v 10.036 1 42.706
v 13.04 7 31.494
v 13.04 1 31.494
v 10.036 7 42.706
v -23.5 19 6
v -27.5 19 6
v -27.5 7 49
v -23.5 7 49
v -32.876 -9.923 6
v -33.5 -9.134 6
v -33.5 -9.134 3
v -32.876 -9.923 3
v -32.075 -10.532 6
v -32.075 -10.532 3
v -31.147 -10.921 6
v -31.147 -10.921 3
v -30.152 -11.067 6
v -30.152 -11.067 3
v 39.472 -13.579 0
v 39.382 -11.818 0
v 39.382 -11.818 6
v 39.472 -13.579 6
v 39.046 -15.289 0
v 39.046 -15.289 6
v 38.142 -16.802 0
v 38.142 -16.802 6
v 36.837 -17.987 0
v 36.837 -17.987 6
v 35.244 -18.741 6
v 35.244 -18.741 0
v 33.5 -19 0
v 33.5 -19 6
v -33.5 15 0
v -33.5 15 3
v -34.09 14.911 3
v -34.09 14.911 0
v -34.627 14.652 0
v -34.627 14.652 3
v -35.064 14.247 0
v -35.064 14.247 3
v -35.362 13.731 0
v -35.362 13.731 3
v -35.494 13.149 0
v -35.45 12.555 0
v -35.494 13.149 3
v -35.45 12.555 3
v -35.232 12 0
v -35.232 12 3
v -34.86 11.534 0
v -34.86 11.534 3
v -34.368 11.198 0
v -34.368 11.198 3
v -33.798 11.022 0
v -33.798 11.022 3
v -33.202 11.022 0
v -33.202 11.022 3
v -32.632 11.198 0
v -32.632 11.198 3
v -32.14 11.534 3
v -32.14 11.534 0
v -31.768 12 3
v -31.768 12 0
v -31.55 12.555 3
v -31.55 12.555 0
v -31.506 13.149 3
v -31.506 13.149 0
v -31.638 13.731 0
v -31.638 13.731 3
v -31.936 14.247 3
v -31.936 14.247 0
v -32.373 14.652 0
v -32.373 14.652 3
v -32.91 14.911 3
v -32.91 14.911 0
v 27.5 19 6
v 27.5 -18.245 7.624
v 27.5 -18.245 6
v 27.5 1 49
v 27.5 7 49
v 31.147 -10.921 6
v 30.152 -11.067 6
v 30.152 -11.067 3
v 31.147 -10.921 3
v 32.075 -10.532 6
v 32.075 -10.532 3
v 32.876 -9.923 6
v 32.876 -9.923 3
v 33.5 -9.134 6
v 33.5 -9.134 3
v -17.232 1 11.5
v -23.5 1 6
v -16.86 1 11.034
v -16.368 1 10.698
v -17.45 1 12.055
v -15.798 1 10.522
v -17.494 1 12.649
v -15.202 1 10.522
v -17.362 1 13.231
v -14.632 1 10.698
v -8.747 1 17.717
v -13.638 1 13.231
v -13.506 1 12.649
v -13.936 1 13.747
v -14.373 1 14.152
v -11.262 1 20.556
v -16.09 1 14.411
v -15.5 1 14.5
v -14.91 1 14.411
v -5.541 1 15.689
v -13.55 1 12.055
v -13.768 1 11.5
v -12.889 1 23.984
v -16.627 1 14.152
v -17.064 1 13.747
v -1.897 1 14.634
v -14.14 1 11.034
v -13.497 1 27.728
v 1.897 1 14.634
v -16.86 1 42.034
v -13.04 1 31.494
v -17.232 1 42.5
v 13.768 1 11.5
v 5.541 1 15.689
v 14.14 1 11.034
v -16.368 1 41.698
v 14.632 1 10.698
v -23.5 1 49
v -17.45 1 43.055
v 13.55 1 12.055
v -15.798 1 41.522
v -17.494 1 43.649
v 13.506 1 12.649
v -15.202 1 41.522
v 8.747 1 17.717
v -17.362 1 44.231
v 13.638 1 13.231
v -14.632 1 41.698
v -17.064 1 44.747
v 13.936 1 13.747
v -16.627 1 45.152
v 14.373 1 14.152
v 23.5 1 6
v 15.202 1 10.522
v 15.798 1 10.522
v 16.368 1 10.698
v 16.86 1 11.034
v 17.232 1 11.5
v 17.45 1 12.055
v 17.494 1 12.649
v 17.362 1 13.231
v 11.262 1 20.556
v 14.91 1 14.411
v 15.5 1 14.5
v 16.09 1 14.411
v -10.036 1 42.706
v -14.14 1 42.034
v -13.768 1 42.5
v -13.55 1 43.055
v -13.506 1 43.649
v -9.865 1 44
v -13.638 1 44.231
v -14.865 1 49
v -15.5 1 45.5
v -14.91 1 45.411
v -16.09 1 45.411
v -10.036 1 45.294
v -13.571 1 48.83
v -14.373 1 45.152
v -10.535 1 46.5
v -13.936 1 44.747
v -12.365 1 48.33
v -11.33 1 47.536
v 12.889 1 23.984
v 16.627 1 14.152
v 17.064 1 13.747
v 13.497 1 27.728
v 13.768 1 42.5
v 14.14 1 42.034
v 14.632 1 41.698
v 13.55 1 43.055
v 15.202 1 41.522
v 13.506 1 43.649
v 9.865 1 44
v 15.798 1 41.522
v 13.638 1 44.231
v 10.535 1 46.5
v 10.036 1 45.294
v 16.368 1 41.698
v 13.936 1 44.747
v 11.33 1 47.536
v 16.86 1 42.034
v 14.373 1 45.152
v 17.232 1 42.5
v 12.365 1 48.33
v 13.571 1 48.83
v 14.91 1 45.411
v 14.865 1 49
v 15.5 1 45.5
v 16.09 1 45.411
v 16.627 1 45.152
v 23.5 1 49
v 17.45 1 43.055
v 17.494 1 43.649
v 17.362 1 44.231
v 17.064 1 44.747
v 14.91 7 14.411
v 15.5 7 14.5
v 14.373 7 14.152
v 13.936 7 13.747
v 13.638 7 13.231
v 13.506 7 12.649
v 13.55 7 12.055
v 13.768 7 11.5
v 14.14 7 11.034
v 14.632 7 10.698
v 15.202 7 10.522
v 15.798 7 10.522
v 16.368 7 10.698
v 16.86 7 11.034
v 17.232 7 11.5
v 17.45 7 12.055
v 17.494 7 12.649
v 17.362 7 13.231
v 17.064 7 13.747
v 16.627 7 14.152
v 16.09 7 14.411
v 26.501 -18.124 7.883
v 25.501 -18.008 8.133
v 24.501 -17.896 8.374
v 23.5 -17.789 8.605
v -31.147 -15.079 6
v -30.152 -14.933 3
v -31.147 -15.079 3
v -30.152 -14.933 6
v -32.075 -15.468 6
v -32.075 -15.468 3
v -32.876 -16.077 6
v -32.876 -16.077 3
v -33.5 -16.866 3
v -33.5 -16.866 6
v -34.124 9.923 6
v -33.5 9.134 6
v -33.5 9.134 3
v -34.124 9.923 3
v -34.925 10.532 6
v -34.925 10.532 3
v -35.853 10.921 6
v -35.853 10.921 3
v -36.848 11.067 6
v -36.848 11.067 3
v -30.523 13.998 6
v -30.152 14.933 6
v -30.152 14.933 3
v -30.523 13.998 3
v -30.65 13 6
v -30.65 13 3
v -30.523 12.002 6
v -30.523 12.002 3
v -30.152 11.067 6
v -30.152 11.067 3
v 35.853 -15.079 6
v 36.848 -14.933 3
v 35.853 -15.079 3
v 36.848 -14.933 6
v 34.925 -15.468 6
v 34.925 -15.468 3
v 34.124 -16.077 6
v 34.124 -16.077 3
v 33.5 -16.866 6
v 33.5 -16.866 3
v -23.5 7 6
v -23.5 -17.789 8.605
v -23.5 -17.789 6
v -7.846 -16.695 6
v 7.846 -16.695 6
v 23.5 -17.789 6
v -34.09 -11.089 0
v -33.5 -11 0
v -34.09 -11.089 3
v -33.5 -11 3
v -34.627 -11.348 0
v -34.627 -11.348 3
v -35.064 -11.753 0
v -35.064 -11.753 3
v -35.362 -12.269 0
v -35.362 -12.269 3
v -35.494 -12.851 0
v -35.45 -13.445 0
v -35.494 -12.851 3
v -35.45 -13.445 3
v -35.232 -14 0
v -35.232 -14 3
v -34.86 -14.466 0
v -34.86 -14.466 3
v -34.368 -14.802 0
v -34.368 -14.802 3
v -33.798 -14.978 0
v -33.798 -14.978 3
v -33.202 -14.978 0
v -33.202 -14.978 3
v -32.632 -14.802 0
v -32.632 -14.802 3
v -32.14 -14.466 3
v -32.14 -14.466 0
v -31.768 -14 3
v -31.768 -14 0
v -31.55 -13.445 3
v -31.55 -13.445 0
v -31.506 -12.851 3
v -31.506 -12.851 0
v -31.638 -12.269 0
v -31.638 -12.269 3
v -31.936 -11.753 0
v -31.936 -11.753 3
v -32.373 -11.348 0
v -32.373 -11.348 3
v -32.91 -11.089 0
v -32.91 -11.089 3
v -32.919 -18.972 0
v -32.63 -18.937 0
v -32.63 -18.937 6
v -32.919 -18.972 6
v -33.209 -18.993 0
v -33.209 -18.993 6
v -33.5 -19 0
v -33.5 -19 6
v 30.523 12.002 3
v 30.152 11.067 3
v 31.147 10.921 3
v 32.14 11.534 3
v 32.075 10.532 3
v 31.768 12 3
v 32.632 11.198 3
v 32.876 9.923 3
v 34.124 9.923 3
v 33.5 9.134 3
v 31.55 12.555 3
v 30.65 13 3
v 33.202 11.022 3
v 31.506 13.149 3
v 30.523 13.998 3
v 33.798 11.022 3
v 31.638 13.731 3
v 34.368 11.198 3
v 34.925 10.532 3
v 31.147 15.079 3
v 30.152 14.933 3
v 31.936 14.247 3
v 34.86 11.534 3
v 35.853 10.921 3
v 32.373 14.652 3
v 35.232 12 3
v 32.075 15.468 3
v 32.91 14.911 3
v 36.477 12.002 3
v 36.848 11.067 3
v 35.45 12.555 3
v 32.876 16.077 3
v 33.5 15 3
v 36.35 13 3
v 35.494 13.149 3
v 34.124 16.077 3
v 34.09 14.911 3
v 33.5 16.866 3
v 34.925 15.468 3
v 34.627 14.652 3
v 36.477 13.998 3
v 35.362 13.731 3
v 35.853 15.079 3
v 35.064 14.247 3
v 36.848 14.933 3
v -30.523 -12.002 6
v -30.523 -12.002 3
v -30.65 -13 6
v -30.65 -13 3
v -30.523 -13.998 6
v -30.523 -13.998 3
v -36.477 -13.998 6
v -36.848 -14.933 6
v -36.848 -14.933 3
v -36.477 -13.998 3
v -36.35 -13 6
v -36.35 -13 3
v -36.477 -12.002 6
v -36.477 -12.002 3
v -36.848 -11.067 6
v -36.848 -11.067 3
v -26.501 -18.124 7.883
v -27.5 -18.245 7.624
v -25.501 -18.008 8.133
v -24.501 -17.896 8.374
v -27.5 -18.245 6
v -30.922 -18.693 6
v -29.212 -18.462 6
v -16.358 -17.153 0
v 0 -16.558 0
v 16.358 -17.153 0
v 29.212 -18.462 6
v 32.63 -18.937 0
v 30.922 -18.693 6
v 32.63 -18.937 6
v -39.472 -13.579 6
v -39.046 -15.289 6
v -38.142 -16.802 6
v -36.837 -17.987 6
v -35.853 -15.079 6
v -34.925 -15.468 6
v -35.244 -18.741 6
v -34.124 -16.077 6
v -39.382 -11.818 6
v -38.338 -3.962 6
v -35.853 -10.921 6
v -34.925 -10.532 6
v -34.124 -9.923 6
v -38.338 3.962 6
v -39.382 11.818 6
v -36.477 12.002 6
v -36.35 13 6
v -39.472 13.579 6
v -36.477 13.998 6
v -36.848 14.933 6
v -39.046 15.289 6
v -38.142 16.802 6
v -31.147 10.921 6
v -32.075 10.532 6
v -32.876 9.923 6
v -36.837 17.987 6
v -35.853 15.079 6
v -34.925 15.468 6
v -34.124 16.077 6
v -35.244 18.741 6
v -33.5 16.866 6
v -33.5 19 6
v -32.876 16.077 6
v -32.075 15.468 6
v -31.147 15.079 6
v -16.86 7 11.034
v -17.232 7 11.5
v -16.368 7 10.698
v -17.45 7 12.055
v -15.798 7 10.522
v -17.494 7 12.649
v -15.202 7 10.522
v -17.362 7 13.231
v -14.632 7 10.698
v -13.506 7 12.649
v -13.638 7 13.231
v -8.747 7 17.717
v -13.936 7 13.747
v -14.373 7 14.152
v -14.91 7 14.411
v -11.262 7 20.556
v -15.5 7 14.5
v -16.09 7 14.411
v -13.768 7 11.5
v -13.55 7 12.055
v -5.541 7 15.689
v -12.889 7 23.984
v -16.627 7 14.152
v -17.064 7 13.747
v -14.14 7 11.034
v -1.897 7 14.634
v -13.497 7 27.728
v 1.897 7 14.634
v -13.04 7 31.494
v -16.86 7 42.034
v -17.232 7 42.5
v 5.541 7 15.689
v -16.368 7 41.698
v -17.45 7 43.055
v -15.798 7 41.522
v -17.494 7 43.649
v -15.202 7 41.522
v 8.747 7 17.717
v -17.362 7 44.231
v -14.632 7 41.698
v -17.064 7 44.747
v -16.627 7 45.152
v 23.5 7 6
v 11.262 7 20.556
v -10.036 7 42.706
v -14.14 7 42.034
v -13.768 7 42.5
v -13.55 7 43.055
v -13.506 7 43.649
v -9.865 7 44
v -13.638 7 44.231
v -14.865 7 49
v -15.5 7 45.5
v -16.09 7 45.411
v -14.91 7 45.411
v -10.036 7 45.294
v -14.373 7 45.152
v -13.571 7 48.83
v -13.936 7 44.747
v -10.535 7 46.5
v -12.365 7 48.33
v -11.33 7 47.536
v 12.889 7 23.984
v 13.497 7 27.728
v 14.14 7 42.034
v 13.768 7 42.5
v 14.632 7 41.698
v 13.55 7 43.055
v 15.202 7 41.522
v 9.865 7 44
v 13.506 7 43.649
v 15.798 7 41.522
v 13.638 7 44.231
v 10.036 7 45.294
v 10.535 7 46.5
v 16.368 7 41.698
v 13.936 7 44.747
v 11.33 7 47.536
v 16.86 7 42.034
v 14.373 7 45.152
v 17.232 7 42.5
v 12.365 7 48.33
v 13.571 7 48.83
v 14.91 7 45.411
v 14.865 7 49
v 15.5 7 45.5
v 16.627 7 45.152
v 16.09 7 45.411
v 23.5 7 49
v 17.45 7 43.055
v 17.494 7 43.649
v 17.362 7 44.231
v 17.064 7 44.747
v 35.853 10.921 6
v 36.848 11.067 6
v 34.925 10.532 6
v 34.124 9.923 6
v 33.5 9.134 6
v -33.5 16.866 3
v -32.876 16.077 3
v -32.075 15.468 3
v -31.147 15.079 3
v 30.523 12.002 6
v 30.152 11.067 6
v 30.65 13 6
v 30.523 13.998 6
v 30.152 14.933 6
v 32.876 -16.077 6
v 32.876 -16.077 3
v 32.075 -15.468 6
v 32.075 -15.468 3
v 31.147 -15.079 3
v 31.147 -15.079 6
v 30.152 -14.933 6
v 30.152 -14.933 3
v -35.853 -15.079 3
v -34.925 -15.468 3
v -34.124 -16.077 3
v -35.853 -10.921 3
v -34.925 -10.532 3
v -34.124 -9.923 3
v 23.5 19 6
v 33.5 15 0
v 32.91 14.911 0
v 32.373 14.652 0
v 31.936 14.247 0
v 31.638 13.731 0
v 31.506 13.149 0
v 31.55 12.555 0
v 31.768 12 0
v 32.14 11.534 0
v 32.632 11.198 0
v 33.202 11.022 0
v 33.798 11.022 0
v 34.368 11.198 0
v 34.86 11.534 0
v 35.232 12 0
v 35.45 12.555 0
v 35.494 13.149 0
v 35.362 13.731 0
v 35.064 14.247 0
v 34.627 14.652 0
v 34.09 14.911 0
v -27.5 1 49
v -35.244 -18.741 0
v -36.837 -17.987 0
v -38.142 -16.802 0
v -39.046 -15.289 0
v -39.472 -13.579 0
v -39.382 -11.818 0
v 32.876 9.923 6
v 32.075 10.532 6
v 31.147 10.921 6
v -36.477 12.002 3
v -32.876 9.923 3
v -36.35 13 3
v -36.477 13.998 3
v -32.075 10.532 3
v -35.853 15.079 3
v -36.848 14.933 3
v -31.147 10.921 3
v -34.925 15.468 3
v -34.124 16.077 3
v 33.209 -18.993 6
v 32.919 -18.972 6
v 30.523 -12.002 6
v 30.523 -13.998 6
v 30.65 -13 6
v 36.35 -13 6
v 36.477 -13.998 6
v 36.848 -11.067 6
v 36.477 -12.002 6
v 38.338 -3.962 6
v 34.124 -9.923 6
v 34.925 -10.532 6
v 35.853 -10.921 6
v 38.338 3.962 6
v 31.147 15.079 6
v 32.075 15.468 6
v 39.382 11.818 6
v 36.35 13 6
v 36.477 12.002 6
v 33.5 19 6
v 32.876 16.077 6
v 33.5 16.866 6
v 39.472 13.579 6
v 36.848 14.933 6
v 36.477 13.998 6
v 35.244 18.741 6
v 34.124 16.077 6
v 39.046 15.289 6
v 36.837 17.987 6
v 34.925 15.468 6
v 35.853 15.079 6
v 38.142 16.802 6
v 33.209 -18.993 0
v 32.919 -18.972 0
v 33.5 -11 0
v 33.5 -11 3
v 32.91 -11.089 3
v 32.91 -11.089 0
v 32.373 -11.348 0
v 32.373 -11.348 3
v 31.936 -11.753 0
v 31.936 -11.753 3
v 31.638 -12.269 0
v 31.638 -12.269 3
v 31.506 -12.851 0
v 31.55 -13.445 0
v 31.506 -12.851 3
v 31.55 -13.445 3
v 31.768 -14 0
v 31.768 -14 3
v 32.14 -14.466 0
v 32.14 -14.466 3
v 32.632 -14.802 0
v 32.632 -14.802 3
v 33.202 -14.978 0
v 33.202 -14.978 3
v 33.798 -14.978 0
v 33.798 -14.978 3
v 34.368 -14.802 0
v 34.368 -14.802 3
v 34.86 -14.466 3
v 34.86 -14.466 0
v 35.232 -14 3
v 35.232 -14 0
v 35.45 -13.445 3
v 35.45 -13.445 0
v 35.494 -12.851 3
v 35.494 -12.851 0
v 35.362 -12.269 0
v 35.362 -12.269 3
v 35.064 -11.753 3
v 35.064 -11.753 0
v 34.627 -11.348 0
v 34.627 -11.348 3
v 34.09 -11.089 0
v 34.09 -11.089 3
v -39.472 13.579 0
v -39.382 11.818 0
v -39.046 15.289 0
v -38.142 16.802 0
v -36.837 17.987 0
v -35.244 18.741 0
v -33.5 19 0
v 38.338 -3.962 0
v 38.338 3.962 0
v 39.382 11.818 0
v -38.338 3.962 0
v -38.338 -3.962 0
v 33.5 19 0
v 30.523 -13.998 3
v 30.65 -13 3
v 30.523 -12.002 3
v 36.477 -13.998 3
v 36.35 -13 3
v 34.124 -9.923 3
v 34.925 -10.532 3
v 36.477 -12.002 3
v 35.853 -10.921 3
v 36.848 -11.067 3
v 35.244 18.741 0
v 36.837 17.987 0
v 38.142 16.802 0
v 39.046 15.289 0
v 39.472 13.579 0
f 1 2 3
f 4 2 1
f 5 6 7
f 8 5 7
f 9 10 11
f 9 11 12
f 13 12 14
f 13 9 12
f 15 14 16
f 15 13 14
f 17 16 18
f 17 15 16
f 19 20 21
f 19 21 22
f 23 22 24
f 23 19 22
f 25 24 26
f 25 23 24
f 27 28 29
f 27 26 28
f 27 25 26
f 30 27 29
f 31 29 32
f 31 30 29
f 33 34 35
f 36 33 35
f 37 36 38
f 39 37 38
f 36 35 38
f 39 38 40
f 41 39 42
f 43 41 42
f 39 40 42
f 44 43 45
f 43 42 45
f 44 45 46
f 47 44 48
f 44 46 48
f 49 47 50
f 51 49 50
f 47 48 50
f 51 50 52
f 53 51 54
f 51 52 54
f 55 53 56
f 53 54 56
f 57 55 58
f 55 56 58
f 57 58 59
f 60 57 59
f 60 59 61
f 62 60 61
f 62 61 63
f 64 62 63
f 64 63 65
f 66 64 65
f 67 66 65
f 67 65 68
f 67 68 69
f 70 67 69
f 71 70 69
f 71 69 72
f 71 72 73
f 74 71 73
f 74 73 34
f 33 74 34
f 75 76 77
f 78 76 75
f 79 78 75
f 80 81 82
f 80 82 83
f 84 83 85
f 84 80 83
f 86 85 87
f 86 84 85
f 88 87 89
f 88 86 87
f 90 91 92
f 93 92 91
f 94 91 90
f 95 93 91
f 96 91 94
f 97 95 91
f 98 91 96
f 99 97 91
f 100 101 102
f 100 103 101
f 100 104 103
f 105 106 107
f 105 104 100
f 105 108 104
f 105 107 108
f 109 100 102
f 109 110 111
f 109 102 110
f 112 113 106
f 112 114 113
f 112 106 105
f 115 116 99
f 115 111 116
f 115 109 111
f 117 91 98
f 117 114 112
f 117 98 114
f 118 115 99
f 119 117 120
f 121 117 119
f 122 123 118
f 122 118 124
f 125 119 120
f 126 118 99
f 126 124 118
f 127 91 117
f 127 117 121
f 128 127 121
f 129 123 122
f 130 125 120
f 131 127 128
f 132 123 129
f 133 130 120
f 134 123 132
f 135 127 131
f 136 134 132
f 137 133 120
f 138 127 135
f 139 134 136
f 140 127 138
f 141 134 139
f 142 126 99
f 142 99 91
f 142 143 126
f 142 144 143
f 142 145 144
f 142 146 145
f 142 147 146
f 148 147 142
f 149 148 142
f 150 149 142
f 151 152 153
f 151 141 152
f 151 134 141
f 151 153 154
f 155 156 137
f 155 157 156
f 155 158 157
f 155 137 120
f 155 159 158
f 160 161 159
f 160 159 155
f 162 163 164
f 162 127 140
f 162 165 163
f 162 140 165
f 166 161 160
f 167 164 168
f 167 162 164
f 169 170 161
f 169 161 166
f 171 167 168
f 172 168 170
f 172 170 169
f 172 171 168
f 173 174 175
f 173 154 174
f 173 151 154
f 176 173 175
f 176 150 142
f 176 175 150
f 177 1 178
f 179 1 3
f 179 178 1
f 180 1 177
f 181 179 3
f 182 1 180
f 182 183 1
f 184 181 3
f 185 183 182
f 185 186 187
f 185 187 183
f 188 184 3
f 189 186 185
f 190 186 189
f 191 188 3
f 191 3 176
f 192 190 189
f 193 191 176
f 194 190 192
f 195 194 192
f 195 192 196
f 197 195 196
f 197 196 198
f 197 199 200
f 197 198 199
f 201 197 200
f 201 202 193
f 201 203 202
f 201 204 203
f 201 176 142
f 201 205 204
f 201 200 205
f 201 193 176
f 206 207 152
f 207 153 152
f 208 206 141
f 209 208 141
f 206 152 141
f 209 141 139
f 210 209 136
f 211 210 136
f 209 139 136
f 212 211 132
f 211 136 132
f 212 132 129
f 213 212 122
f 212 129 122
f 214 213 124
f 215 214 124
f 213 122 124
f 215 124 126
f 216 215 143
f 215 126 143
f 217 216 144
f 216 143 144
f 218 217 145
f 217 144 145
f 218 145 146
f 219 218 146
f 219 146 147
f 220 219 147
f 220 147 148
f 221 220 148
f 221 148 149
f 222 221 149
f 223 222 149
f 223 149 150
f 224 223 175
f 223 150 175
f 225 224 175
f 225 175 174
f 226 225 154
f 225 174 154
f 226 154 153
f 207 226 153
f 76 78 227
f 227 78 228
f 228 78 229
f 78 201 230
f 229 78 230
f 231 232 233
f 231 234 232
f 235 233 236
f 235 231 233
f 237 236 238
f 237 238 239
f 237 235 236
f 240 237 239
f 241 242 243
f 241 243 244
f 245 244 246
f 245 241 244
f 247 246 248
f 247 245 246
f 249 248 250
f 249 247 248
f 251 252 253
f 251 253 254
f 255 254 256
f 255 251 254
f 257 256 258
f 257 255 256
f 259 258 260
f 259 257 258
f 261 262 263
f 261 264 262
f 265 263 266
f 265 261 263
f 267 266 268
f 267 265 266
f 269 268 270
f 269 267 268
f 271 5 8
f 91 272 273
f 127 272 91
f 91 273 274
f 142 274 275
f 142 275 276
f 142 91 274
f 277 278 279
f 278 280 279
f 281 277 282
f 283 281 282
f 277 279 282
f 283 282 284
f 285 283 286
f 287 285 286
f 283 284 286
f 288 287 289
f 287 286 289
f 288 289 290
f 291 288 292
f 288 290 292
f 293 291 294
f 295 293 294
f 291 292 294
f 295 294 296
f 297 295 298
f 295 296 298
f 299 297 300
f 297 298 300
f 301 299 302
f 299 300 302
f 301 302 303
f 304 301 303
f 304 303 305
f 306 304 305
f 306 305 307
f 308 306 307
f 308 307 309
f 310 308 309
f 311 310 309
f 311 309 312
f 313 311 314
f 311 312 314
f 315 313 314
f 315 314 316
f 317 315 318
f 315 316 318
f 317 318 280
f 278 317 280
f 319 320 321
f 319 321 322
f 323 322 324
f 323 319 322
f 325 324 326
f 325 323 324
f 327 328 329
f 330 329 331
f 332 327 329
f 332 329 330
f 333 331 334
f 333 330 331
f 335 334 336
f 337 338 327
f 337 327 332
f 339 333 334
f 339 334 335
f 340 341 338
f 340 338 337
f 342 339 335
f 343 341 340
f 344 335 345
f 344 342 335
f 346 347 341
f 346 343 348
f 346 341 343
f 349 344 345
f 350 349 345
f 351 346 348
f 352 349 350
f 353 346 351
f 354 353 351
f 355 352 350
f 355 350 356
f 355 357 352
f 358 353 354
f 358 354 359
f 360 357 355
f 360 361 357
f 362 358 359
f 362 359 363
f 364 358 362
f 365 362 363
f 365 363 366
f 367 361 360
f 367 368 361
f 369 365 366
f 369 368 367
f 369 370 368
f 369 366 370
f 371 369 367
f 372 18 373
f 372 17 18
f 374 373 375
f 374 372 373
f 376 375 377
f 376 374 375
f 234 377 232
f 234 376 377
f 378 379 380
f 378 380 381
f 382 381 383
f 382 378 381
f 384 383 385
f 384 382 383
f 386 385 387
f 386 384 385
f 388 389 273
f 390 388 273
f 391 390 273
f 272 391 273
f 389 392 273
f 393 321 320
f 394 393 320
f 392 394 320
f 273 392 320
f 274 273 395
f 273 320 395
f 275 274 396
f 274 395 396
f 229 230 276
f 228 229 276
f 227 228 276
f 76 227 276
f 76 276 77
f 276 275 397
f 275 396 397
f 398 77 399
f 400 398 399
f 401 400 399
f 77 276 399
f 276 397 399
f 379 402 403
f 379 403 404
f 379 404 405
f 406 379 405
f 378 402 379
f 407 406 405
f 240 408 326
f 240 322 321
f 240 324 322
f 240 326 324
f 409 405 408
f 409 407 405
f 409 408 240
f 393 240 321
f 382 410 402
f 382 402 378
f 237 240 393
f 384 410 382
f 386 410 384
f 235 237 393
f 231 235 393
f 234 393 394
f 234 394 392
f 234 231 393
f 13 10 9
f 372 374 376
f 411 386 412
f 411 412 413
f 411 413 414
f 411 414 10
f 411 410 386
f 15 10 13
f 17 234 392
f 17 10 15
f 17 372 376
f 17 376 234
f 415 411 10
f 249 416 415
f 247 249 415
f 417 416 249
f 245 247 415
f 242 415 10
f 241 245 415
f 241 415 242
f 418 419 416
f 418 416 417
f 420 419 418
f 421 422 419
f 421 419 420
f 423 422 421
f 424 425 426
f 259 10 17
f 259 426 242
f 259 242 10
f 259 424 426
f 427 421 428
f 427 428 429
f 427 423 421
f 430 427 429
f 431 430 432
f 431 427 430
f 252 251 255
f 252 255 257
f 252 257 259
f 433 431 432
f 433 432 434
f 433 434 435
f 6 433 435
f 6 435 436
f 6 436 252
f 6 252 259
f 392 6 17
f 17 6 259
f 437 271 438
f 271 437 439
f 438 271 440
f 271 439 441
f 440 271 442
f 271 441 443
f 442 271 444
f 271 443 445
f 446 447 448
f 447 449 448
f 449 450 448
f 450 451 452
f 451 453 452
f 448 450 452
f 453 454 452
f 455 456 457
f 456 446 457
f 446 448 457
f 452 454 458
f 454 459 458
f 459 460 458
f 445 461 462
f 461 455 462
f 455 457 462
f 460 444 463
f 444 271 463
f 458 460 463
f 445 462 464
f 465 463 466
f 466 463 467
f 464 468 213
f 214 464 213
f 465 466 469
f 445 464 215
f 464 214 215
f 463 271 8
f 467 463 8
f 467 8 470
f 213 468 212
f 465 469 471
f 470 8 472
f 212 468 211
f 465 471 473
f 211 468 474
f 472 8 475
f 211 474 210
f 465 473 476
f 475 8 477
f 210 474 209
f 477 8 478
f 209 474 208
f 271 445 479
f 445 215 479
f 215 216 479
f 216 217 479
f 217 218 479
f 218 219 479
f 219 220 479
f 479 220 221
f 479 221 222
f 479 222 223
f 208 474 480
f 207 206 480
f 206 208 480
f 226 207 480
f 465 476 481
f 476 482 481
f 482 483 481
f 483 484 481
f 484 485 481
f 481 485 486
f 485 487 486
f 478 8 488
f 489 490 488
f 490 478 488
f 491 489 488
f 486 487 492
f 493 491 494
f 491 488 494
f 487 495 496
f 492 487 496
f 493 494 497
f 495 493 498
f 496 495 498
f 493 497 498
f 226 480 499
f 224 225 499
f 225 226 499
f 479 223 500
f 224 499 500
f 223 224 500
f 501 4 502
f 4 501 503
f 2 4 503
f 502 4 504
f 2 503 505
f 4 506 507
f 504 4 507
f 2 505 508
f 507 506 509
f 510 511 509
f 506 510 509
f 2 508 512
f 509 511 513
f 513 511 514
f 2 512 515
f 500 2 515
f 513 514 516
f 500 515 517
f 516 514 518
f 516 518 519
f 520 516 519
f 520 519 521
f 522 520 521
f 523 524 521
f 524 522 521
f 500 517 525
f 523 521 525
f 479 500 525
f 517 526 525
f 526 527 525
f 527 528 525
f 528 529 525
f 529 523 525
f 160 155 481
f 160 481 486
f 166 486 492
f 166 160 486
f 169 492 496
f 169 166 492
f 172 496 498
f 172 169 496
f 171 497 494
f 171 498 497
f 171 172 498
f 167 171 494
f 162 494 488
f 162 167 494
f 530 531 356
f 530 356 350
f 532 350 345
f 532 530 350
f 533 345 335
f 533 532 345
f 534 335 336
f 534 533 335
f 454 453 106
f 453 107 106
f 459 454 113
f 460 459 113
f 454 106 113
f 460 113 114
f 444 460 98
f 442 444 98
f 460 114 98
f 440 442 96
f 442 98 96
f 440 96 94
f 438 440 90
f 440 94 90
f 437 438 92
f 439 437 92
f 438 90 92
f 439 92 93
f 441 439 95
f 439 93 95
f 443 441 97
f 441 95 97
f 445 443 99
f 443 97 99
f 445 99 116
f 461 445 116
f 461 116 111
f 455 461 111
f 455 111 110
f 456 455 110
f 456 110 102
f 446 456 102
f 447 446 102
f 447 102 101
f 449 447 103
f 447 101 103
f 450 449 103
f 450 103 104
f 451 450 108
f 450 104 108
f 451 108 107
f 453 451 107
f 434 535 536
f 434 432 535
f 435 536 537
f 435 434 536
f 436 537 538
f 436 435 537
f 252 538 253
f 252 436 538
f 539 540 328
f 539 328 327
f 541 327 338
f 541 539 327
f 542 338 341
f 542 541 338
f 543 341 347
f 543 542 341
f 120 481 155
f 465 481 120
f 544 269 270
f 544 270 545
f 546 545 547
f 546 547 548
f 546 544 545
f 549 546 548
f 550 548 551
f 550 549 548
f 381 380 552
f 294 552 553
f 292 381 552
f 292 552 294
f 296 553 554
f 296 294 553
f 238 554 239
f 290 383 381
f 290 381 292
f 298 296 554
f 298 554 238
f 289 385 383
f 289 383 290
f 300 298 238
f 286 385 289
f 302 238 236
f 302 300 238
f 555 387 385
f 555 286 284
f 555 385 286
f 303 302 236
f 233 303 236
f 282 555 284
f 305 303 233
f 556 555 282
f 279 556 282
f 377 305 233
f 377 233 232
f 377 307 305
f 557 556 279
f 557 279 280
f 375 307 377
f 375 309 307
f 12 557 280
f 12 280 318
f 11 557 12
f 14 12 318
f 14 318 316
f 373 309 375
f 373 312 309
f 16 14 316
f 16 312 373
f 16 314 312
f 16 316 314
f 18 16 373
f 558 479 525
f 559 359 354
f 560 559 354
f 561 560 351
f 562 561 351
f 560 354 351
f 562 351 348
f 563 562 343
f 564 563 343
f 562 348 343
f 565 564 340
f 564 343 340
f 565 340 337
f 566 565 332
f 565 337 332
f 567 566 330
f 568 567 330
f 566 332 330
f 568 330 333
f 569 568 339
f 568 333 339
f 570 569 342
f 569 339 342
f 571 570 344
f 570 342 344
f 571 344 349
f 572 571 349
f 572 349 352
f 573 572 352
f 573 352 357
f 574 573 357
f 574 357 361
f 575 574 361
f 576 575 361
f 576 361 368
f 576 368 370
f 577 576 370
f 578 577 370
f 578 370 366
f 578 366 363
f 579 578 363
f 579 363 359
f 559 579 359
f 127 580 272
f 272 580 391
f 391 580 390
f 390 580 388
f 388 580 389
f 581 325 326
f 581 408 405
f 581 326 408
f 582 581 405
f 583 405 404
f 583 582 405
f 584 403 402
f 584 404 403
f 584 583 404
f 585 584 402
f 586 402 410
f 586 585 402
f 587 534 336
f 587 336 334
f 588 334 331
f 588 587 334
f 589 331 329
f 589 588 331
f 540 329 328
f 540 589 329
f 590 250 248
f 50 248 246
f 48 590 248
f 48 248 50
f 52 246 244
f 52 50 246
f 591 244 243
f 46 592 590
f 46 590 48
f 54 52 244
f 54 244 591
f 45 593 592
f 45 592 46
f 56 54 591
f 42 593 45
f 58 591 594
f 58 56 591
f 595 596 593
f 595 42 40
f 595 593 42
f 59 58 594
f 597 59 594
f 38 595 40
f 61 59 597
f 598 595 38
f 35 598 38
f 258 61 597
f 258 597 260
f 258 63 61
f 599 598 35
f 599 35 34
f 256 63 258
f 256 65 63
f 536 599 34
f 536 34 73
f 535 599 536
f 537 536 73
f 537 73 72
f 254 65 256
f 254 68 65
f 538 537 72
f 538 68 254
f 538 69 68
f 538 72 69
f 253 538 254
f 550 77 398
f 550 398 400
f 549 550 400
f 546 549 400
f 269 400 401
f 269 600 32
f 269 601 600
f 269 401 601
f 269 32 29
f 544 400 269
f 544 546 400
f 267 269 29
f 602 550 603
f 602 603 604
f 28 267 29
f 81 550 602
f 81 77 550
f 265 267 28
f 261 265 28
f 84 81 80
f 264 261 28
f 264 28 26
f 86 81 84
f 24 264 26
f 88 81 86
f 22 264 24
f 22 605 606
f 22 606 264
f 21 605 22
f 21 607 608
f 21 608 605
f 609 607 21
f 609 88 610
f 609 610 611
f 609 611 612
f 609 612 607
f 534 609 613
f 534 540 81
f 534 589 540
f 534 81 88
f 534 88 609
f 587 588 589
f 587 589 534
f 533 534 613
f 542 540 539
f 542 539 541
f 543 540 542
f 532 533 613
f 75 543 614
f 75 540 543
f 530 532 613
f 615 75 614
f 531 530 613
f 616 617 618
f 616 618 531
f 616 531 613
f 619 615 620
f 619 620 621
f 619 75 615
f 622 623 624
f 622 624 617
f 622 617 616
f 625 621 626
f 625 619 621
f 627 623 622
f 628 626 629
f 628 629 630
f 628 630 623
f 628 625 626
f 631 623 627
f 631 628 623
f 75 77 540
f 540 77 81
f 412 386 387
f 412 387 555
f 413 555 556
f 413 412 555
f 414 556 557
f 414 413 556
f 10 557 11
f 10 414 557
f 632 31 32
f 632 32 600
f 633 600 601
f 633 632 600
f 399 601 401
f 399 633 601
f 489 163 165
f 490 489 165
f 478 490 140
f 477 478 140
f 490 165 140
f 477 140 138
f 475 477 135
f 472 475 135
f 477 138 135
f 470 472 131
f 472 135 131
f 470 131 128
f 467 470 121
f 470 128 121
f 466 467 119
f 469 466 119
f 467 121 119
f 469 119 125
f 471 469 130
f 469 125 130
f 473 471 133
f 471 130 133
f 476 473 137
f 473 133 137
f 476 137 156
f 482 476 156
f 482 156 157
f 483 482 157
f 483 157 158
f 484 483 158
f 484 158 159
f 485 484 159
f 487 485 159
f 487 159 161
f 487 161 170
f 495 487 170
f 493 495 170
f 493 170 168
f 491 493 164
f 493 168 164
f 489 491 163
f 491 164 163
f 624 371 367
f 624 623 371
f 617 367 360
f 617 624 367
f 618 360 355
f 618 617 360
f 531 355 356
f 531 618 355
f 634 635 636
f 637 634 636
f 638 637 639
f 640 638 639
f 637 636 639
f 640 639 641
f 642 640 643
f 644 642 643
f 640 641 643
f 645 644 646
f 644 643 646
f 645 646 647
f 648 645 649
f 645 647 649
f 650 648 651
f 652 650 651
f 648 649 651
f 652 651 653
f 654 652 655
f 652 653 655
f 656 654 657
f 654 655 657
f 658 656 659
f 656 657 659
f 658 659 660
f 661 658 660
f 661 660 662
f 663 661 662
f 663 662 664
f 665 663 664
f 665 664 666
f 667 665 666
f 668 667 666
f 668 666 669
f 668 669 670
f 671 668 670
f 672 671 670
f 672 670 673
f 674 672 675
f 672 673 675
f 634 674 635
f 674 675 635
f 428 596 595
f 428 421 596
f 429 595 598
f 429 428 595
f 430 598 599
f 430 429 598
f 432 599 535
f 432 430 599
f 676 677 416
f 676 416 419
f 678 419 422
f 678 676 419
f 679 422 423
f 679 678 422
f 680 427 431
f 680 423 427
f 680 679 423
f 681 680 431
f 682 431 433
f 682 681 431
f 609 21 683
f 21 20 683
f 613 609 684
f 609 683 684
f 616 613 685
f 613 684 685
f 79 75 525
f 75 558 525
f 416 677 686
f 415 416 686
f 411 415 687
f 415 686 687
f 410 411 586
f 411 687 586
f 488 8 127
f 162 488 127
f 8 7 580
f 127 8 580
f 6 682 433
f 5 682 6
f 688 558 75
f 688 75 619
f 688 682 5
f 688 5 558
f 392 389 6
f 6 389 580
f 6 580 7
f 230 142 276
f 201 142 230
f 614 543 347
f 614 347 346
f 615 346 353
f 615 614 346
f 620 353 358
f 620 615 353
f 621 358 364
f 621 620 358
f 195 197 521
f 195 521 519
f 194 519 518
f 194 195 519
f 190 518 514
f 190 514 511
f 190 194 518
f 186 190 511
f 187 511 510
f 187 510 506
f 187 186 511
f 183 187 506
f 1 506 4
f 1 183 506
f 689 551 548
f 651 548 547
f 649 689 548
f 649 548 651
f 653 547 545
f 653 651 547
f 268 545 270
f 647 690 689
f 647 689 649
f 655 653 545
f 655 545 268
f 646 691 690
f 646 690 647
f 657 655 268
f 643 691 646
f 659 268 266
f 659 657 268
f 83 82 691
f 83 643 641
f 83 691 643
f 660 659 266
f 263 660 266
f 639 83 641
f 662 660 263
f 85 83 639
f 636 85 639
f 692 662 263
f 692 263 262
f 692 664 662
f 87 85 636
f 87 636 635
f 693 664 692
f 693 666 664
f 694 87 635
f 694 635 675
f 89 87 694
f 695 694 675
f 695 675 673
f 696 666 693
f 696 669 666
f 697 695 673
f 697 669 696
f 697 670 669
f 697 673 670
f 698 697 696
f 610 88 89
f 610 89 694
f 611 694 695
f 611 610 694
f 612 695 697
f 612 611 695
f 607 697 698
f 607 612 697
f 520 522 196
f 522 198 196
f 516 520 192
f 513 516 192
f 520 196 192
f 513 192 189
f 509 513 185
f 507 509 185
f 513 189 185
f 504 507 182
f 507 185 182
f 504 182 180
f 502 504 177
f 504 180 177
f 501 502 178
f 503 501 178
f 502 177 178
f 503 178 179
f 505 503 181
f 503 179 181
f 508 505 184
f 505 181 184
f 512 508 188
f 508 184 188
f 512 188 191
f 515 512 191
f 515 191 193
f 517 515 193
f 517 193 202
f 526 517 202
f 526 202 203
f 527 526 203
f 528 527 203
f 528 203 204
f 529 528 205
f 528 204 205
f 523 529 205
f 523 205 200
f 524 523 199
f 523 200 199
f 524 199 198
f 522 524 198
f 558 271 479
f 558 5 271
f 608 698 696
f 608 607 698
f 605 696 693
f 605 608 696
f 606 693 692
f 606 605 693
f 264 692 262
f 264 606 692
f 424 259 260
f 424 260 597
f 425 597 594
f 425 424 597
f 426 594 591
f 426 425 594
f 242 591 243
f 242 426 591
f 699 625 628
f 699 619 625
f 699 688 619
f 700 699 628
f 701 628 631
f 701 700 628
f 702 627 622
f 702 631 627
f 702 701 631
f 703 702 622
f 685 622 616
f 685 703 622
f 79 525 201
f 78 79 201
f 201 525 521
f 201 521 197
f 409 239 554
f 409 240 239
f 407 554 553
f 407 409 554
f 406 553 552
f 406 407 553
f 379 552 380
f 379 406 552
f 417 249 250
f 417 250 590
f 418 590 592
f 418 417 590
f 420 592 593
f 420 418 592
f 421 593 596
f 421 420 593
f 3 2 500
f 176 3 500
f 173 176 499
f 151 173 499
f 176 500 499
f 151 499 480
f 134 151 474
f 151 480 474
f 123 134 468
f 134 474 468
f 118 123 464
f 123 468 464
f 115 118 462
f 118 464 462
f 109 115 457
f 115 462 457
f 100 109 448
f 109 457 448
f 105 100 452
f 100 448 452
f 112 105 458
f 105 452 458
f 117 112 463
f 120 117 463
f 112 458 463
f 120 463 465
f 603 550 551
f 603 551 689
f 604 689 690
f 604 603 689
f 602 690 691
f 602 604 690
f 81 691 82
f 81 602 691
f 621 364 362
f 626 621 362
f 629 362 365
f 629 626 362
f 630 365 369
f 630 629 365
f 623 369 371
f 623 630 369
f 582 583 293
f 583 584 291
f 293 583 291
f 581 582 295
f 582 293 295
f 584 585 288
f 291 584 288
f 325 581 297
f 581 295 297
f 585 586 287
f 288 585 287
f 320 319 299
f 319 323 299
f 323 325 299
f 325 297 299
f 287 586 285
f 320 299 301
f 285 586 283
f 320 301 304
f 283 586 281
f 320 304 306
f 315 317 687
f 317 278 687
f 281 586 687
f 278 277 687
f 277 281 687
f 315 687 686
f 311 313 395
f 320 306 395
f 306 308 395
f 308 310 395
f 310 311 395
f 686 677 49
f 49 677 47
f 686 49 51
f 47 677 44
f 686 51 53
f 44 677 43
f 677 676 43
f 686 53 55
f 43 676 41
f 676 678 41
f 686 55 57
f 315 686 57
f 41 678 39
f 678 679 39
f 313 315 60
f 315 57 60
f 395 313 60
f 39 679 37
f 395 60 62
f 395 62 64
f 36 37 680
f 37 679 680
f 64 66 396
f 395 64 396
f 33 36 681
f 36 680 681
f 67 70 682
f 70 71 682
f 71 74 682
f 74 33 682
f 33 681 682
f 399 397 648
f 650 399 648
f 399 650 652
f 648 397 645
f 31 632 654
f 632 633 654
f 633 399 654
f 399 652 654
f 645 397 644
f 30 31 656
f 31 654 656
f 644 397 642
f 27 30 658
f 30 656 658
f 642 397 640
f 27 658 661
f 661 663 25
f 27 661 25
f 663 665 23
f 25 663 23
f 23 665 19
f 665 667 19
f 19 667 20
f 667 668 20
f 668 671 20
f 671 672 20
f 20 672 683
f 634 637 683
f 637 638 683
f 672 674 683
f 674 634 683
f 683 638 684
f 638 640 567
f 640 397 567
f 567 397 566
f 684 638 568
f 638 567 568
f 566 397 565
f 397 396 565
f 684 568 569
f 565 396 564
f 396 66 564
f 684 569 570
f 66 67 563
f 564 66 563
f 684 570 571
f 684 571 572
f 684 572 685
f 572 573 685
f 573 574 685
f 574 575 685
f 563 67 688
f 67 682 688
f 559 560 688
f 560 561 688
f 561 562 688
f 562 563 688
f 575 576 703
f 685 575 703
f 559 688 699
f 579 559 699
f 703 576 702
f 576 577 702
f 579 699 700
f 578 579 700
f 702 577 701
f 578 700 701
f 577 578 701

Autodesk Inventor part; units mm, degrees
ref_plane "YZ Plane" through (0, 0, 0) normal (1, 0, 0) x (0, 1, 0)
ref_plane "XZ Plane" through (0, 0, 0) normal (0, 1, 0) x (-1, 0, 0)
ref_plane "XY Plane" through (0, 0, 0) normal (0, 0, 1) x (1, 0, 0)
sketch "Sketch1" plane through (0, 0, 0) normal (0, 0, 1) x (1, 0, 0)
  line L0 (-33.5, -13) -> (33.5, -13) construction
  line L1 (33.5, -13) -> (33.5, 13) construction
  line L2 (33.5, 13) -> (-33.5, 13) construction
  line L3 (-33.5, 13) -> (-33.5, -13) construction
  line L4 (-33.5, -13) -> (33.5, 13) construction
  line L5 (33.5, -13) -> (-33.5, 13) construction
  arc A0 (-33.5, 19) -> (-39.3825, 11.8182) centre (-33.5, 13) ccw
  arc A1 (-39.3825, -11.8182) -> (-33.5, -19) centre (-33.5, -13) ccw
  arc A2 (33.5, -19) -> (39.3825, -11.8182) centre (33.5, -13) ccw
  arc A3 (39.3825, 11.8182) -> (33.5, 19) centre (33.5, 13) ccw
  arc A4 (-39.3825, -11.8182) -> (-39.3825, 11.8182) centre (-98.207, 0) ccw
  arc A5 (39.3825, 11.8182) -> (39.3825, -11.8182) centre (98.207, 0) ccw
  line L6 (-33.5, 19) -> (33.5, 19)
  line L7 (-33.5, -19) -> (33.5, -19)
  point P0 (0, 0)
  dimension "d0" = 67
  dimension "d1" = 26
  dimension "d2" = 6
  dimension "d3" = 60
extrude "Extrusion1" add sketch "Sketch1" along normal blind 6
sketch "Sketch2" plane through (0, 0, 0) normal (1, 0, 0) x (0, 1, 0)
  line L0 (19, 6) -> (11.8182, 6) construction
  line L1 (19, 6) -> (7, 49)
  line L2 (7, 49) -> (1, 49)
  line L3 (1, 49) -> (-19, 6)
  line L4 (19, 6) -> (11.8182, 6) construction
  line L5 (11.8182, 6) -> (-11.8182, 6) construction
  line L6 (-11.8182, 6) -> (-19, 6) construction
  line L7 (-19, 6) -> (-11.8182, 6) construction
  line L8 (-11.8182, 6) -> (11.8182, 6) construction
  line L9 (11.8182, 6) -> (19, 6) construction
  line L10 (19, 6) -> (-19, 6)
  point P0 (0, 0)
  dimension "d7" = 12
  dimension "d8" = 43
  dimension "d9" = 6
extrude "Extrusion2" add sketch "Sketch2" along normal mid plane 55
sketch "Sketch3" plane through (-27.5, 1, 49) normal (0, 0, 1) x (1, 0, 0)
  line L0 (0, 0) -> (55, 0) projected
  line L1 (55, 6) -> (55, 0) projected
  line L2 (0, 6) -> (55, 6) projected
  line L3 (0, 0) -> (0, 6) projected
  line L4 (0, 6) -> (55, 6) projected
  line L5 (61, 18) -> (-6, 18) projected
  line L6 (4, 6) -> (51, 6)
  line L7 (51, 6) -> (51, 18)
  line L8 (51, 18) -> (4, 18)
  line L9 (4, 18) -> (4, 6)
  line L10 (0, 0) -> (55, 0) projected
  line L11 (-6, -20) -> (61, -20) projected
  line L12 (4, 0) -> (51, 0)
  line L13 (51, 0) -> (51, -20)
  line L14 (51, -20) -> (4, -20)
  line L15 (4, -20) -> (4, 0)
  point P0 (27.5, -1)
  dimension "d12" = 4
  dimension "d13" = 4
extrude "Extrusion3" cut sketch "Sketch3" against normal up to surface (43 mm away) contours L0 L13 L11 L15 | L9 L5 L7 L2
sketch "Sketch4" plane through (-23.5, 7, 49) normal (0, 1, 0) x (1, 0, 0)
  arc A0 (36.54, 17.5059) -> (10.46, 17.5059) centre (23.5, 21) ccw
  line L0 (47, 43) -> (0, 43) projected
  line L1 (57, 49) -> (-10, 49) projected
  line L2 (36.54, 17.5059) -> (31.8493, 0)
  line L3 (31.8493, 0) -> (15.1507, 0)
  line L4 (15.1507, 0) -> (10.46, 17.5059)
  line L5 (0, 0) -> (47, 0) projected
  arc A1 (10.46, 17.5059) -> (36.54, 17.5059) centre (23.5, 21) ccw construction
  point P0 (23.5, 49)
  point P1 (23.5, 49)
  point P2 (23.5, 0)
  point P3 (23.5, 49)
  dimension "d16" = 27
  dimension "d17" = 22
  dimension "d18" = 30
extrude "Extrusion4" cut sketch "Sketch4" against normal blind 55
fillet "Fillet1" radius 5 2 edges at (8.3493, 4, 49) (-8.3493, 4, 49)
sketch "Sketch5" plane through (-23.5, 7, 6) normal (0, 1, 0) x (1, 0, 0)
  arc A0 (36.54, -25.4941) -> (10.46, -25.4941) centre (23.5, -22) ccw projected
  line L0 (8, -6.5) -> (39, -6.5)
  line L1 (39, -6.5) -> (39, -37.5)
  line L2 (39, -37.5) -> (8, -37.5)
  line L3 (8, -37.5) -> (8, -6.5)
  line L4 (8, -6.5) -> (39, -37.5) construction
  line L5 (39, -6.5) -> (8, -37.5) construction
  point P0 (23.5, 6)
  dimension "d22" = 31
  dimension "d23" = 31
hole "Hole1" at (-15.5, 7, 12.5) at (15.5, 7, 12.5) at (15.5, 7, 43.5) at (-15.5, 7, 43.5) direction (0, -1, 0) diameter 4 end through all
sketch "Sketch6" plane through (0, 0, 0) normal (0, 0, -1) x (-1, 0, 0)
  arc A0 (-33.5, -19) -> (-32.6299, -18.9366) centre (-33.5, -13) ccw
  arc A1 (32.6299, -18.9366) -> (-32.6299, -18.9366) centre (0, -241.558) ccw
  arc A2 (32.6299, -18.9366) -> (33.5, -19) centre (33.5, -13) ccw
  line L0 (-33.5, -19) -> (33.5, -19)
  arc A3 (33.5, -19) -> (39.3825, -11.8182) centre (33.5, -13) ccw projected
  arc A4 (-39.3825, -11.8182) -> (-33.5, -19) centre (-33.5, -13) ccw projected
  point P0 (0, 0)
  dimension "d31" = 225
extrude "Extrusion5" cut sketch "Sketch6" against normal blind 55
sketch "Sketch7" plane through (0, 0, 0) normal (0, 0, -1) x (-1, 0, 0)
  line L0 (-33.5, -13) -> (33.5, -13) construction
  line L1 (33.5, -13) -> (33.5, 13) construction
  line L2 (33.5, 13) -> (-33.5, 13) construction
  line L3 (-33.5, 13) -> (-33.5, -13) construction
  line L4 (-33.5, -13) -> (33.5, 13) construction
  line L5 (33.5, -13) -> (-33.5, 13) construction
  arc A0 (-39.3825, -11.8182) -> (-32.6299, -18.9366) centre (-33.5, -13) ccw construction
  arc A1 (32.6299, -18.9366) -> (-32.6299, -18.9366) centre (0, -241.558) ccw construction
  arc A2 (32.6299, -18.9366) -> (39.3825, -11.8182) centre (33.5, -13) ccw construction
  arc A3 (39.3825, 11.8182) -> (39.3825, -11.8182) centre (98.207, 0) ccw construction
  arc A4 (39.3825, 11.8182) -> (33.5, 19) centre (33.5, 13) ccw construction
  line L6 (-33.5, 19) -> (33.5, 19) construction
  arc A5 (-33.5, 19) -> (-39.3825, 11.8182) centre (-33.5, 13) ccw construction
  arc A6 (-39.3825, -11.8182) -> (-39.3825, 11.8182) centre (-98.207, 0) ccw construction
  point P0 (0, 0)
  point P1 (0, 0)
  dimension "d34" = 67
  dimension "d35" = 26
hole "Hole2" at (33.5, 13, 0) at (33.5, -13, 0) at (-33.5, -13, 0) at (-33.5, 13, 0) direction (0, 0, 1) diameter 4 depth 14.2 tip angle 118
sketch "Sketch8" plane through (0, 0, 6) normal (0, 0, 1) x (1, 0, 0)
  circle A0 centre (-33.5, -13) radius 2 projected
  circle A1 centre (-33.5, 13) radius 2 projected
  arc A2 (-39.3825, -11.8182) -> (-32.6299, -18.9366) centre (-33.5, -13) ccw projected
  arc A3 (-27.5, -18.2449) -> (-32.6299, -18.9366) centre (0, -241.558) ccw projected
  line L0 (-27.5, -18.2449) -> (-27.5, 19) projected
  line L1 (-27.5, 19) -> (-33.5, 19) projected
  arc A4 (-33.5, 19) -> (-39.3825, 11.8182) centre (-33.5, 13) ccw projected
  arc A5 (-39.3825, -11.8182) -> (-39.3825, 11.8182) centre (-98.207, 0) ccw projected
  circle A6 centre (33.5, 13) radius 2 projected
  circle A7 centre (33.5, -13) radius 2 projected
  arc A8 (32.6299, -18.9366) -> (39.3825, -11.8182) centre (33.5, -13) ccw projected
  arc A9 (39.3825, 11.8182) -> (39.3825, -11.8182) centre (98.207, 0) ccw projected
  arc A10 (39.3825, 11.8182) -> (33.5, 19) centre (33.5, 13) ccw projected
  line L2 (33.5, 19) -> (27.5, 19) projected
  line L3 (27.5, 19) -> (27.5, -18.2449) projected
  arc A11 (32.6299, -18.9366) -> (27.5, -18.2449) centre (0, -241.558) ccw projected
  line L4 (-30.1519, 11.067) -> (-33.5, 9.134)
  line L5 (-33.5, 9.134) -> (-36.8481, 11.067)
  line L6 (-36.8481, 11.067) -> (-36.8481, 14.933)
  line L7 (-36.8481, 14.933) -> (-33.5, 16.866)
  line L8 (-33.5, 16.866) -> (-30.1519, 14.933)
  line L9 (-30.1519, 14.933) -> (-30.1519, 11.067)
  line L10 (-30.1519, -14.933) -> (-33.5, -16.866)
  line L11 (-33.5, -16.866) -> (-36.8481, -14.933)
  line L12 (-36.8481, -14.933) -> (-36.8481, -11.067)
  line L13 (-36.8481, -11.067) -> (-33.5, -9.134)
  line L14 (-33.5, -9.134) -> (-30.1519, -11.067)
  line L15 (-30.1519, -11.067) -> (-30.1519, -14.933)
  line L16 (36.8481, -14.933) -> (33.5, -16.866)
  line L17 (33.5, -16.866) -> (30.1519, -14.933)
  line L18 (30.1519, -14.933) -> (30.1519, -11.067)
  line L19 (30.1519, -11.067) -> (33.5, -9.134)
  line L20 (33.5, -9.134) -> (36.8481, -11.067)
  line L21 (36.8481, -11.067) -> (36.8481, -14.933)
  line L22 (36.8481, 11.067) -> (33.5, 9.134) construction
  line L23 (33.5, 9.134) -> (30.1519, 11.067) construction
  line L24 (30.1519, 11.067) -> (30.1519, 14.933) construction
  line L25 (30.1519, 14.933) -> (33.5, 16.866) construction
  line L26 (33.5, 16.866) -> (36.8481, 14.933) construction
  line L27 (36.8481, 14.933) -> (36.8481, 11.067) construction
  arc A12 (30.1519, 14.933) -> (33.5, 16.866) centre (30.075, 18.9323) ccw
  arc A13 (33.5, 16.866) -> (36.8481, 14.933) centre (36.925, 18.9323) ccw
  arc A14 (36.8481, 11.067) -> (33.5, 9.134) centre (36.925, 7.0677) ccw
  arc A15 (33.5, 9.134) -> (30.1519, 11.067) centre (30.075, 7.0677) ccw
  arc A16 (30.1519, 11.067) -> (30.1519, 14.933) centre (26.65, 13) ccw
  arc A17 (36.8481, 14.933) -> (36.8481, 11.067) centre (40.35, 13) ccw
  point P0 (0, 0)
  dimension "d44" = 6.6962
  dimension "d47" = 4
  dimension "d48" = 4
  dimension "d49" = 4
  dimension "d50" = 4
  dimension "d51" = 4
  dimension "d52" = 4
  dimension "d53" = 5.7
extrude "Extrusion6" cut sketch "Sketch8" against normal blind 3 contours A12 A13 A17 A14 A15 A16
pattern_linear "Rectangular Pattern1" count 2 spacing 67 along (-1, 0, 0) count 2 spacing 26 along (0, -1, 0) of "Extrusion6"
equation "\"d13\" = d12"
properties part number "Y Motor Mount" material "ABS Plastic"
